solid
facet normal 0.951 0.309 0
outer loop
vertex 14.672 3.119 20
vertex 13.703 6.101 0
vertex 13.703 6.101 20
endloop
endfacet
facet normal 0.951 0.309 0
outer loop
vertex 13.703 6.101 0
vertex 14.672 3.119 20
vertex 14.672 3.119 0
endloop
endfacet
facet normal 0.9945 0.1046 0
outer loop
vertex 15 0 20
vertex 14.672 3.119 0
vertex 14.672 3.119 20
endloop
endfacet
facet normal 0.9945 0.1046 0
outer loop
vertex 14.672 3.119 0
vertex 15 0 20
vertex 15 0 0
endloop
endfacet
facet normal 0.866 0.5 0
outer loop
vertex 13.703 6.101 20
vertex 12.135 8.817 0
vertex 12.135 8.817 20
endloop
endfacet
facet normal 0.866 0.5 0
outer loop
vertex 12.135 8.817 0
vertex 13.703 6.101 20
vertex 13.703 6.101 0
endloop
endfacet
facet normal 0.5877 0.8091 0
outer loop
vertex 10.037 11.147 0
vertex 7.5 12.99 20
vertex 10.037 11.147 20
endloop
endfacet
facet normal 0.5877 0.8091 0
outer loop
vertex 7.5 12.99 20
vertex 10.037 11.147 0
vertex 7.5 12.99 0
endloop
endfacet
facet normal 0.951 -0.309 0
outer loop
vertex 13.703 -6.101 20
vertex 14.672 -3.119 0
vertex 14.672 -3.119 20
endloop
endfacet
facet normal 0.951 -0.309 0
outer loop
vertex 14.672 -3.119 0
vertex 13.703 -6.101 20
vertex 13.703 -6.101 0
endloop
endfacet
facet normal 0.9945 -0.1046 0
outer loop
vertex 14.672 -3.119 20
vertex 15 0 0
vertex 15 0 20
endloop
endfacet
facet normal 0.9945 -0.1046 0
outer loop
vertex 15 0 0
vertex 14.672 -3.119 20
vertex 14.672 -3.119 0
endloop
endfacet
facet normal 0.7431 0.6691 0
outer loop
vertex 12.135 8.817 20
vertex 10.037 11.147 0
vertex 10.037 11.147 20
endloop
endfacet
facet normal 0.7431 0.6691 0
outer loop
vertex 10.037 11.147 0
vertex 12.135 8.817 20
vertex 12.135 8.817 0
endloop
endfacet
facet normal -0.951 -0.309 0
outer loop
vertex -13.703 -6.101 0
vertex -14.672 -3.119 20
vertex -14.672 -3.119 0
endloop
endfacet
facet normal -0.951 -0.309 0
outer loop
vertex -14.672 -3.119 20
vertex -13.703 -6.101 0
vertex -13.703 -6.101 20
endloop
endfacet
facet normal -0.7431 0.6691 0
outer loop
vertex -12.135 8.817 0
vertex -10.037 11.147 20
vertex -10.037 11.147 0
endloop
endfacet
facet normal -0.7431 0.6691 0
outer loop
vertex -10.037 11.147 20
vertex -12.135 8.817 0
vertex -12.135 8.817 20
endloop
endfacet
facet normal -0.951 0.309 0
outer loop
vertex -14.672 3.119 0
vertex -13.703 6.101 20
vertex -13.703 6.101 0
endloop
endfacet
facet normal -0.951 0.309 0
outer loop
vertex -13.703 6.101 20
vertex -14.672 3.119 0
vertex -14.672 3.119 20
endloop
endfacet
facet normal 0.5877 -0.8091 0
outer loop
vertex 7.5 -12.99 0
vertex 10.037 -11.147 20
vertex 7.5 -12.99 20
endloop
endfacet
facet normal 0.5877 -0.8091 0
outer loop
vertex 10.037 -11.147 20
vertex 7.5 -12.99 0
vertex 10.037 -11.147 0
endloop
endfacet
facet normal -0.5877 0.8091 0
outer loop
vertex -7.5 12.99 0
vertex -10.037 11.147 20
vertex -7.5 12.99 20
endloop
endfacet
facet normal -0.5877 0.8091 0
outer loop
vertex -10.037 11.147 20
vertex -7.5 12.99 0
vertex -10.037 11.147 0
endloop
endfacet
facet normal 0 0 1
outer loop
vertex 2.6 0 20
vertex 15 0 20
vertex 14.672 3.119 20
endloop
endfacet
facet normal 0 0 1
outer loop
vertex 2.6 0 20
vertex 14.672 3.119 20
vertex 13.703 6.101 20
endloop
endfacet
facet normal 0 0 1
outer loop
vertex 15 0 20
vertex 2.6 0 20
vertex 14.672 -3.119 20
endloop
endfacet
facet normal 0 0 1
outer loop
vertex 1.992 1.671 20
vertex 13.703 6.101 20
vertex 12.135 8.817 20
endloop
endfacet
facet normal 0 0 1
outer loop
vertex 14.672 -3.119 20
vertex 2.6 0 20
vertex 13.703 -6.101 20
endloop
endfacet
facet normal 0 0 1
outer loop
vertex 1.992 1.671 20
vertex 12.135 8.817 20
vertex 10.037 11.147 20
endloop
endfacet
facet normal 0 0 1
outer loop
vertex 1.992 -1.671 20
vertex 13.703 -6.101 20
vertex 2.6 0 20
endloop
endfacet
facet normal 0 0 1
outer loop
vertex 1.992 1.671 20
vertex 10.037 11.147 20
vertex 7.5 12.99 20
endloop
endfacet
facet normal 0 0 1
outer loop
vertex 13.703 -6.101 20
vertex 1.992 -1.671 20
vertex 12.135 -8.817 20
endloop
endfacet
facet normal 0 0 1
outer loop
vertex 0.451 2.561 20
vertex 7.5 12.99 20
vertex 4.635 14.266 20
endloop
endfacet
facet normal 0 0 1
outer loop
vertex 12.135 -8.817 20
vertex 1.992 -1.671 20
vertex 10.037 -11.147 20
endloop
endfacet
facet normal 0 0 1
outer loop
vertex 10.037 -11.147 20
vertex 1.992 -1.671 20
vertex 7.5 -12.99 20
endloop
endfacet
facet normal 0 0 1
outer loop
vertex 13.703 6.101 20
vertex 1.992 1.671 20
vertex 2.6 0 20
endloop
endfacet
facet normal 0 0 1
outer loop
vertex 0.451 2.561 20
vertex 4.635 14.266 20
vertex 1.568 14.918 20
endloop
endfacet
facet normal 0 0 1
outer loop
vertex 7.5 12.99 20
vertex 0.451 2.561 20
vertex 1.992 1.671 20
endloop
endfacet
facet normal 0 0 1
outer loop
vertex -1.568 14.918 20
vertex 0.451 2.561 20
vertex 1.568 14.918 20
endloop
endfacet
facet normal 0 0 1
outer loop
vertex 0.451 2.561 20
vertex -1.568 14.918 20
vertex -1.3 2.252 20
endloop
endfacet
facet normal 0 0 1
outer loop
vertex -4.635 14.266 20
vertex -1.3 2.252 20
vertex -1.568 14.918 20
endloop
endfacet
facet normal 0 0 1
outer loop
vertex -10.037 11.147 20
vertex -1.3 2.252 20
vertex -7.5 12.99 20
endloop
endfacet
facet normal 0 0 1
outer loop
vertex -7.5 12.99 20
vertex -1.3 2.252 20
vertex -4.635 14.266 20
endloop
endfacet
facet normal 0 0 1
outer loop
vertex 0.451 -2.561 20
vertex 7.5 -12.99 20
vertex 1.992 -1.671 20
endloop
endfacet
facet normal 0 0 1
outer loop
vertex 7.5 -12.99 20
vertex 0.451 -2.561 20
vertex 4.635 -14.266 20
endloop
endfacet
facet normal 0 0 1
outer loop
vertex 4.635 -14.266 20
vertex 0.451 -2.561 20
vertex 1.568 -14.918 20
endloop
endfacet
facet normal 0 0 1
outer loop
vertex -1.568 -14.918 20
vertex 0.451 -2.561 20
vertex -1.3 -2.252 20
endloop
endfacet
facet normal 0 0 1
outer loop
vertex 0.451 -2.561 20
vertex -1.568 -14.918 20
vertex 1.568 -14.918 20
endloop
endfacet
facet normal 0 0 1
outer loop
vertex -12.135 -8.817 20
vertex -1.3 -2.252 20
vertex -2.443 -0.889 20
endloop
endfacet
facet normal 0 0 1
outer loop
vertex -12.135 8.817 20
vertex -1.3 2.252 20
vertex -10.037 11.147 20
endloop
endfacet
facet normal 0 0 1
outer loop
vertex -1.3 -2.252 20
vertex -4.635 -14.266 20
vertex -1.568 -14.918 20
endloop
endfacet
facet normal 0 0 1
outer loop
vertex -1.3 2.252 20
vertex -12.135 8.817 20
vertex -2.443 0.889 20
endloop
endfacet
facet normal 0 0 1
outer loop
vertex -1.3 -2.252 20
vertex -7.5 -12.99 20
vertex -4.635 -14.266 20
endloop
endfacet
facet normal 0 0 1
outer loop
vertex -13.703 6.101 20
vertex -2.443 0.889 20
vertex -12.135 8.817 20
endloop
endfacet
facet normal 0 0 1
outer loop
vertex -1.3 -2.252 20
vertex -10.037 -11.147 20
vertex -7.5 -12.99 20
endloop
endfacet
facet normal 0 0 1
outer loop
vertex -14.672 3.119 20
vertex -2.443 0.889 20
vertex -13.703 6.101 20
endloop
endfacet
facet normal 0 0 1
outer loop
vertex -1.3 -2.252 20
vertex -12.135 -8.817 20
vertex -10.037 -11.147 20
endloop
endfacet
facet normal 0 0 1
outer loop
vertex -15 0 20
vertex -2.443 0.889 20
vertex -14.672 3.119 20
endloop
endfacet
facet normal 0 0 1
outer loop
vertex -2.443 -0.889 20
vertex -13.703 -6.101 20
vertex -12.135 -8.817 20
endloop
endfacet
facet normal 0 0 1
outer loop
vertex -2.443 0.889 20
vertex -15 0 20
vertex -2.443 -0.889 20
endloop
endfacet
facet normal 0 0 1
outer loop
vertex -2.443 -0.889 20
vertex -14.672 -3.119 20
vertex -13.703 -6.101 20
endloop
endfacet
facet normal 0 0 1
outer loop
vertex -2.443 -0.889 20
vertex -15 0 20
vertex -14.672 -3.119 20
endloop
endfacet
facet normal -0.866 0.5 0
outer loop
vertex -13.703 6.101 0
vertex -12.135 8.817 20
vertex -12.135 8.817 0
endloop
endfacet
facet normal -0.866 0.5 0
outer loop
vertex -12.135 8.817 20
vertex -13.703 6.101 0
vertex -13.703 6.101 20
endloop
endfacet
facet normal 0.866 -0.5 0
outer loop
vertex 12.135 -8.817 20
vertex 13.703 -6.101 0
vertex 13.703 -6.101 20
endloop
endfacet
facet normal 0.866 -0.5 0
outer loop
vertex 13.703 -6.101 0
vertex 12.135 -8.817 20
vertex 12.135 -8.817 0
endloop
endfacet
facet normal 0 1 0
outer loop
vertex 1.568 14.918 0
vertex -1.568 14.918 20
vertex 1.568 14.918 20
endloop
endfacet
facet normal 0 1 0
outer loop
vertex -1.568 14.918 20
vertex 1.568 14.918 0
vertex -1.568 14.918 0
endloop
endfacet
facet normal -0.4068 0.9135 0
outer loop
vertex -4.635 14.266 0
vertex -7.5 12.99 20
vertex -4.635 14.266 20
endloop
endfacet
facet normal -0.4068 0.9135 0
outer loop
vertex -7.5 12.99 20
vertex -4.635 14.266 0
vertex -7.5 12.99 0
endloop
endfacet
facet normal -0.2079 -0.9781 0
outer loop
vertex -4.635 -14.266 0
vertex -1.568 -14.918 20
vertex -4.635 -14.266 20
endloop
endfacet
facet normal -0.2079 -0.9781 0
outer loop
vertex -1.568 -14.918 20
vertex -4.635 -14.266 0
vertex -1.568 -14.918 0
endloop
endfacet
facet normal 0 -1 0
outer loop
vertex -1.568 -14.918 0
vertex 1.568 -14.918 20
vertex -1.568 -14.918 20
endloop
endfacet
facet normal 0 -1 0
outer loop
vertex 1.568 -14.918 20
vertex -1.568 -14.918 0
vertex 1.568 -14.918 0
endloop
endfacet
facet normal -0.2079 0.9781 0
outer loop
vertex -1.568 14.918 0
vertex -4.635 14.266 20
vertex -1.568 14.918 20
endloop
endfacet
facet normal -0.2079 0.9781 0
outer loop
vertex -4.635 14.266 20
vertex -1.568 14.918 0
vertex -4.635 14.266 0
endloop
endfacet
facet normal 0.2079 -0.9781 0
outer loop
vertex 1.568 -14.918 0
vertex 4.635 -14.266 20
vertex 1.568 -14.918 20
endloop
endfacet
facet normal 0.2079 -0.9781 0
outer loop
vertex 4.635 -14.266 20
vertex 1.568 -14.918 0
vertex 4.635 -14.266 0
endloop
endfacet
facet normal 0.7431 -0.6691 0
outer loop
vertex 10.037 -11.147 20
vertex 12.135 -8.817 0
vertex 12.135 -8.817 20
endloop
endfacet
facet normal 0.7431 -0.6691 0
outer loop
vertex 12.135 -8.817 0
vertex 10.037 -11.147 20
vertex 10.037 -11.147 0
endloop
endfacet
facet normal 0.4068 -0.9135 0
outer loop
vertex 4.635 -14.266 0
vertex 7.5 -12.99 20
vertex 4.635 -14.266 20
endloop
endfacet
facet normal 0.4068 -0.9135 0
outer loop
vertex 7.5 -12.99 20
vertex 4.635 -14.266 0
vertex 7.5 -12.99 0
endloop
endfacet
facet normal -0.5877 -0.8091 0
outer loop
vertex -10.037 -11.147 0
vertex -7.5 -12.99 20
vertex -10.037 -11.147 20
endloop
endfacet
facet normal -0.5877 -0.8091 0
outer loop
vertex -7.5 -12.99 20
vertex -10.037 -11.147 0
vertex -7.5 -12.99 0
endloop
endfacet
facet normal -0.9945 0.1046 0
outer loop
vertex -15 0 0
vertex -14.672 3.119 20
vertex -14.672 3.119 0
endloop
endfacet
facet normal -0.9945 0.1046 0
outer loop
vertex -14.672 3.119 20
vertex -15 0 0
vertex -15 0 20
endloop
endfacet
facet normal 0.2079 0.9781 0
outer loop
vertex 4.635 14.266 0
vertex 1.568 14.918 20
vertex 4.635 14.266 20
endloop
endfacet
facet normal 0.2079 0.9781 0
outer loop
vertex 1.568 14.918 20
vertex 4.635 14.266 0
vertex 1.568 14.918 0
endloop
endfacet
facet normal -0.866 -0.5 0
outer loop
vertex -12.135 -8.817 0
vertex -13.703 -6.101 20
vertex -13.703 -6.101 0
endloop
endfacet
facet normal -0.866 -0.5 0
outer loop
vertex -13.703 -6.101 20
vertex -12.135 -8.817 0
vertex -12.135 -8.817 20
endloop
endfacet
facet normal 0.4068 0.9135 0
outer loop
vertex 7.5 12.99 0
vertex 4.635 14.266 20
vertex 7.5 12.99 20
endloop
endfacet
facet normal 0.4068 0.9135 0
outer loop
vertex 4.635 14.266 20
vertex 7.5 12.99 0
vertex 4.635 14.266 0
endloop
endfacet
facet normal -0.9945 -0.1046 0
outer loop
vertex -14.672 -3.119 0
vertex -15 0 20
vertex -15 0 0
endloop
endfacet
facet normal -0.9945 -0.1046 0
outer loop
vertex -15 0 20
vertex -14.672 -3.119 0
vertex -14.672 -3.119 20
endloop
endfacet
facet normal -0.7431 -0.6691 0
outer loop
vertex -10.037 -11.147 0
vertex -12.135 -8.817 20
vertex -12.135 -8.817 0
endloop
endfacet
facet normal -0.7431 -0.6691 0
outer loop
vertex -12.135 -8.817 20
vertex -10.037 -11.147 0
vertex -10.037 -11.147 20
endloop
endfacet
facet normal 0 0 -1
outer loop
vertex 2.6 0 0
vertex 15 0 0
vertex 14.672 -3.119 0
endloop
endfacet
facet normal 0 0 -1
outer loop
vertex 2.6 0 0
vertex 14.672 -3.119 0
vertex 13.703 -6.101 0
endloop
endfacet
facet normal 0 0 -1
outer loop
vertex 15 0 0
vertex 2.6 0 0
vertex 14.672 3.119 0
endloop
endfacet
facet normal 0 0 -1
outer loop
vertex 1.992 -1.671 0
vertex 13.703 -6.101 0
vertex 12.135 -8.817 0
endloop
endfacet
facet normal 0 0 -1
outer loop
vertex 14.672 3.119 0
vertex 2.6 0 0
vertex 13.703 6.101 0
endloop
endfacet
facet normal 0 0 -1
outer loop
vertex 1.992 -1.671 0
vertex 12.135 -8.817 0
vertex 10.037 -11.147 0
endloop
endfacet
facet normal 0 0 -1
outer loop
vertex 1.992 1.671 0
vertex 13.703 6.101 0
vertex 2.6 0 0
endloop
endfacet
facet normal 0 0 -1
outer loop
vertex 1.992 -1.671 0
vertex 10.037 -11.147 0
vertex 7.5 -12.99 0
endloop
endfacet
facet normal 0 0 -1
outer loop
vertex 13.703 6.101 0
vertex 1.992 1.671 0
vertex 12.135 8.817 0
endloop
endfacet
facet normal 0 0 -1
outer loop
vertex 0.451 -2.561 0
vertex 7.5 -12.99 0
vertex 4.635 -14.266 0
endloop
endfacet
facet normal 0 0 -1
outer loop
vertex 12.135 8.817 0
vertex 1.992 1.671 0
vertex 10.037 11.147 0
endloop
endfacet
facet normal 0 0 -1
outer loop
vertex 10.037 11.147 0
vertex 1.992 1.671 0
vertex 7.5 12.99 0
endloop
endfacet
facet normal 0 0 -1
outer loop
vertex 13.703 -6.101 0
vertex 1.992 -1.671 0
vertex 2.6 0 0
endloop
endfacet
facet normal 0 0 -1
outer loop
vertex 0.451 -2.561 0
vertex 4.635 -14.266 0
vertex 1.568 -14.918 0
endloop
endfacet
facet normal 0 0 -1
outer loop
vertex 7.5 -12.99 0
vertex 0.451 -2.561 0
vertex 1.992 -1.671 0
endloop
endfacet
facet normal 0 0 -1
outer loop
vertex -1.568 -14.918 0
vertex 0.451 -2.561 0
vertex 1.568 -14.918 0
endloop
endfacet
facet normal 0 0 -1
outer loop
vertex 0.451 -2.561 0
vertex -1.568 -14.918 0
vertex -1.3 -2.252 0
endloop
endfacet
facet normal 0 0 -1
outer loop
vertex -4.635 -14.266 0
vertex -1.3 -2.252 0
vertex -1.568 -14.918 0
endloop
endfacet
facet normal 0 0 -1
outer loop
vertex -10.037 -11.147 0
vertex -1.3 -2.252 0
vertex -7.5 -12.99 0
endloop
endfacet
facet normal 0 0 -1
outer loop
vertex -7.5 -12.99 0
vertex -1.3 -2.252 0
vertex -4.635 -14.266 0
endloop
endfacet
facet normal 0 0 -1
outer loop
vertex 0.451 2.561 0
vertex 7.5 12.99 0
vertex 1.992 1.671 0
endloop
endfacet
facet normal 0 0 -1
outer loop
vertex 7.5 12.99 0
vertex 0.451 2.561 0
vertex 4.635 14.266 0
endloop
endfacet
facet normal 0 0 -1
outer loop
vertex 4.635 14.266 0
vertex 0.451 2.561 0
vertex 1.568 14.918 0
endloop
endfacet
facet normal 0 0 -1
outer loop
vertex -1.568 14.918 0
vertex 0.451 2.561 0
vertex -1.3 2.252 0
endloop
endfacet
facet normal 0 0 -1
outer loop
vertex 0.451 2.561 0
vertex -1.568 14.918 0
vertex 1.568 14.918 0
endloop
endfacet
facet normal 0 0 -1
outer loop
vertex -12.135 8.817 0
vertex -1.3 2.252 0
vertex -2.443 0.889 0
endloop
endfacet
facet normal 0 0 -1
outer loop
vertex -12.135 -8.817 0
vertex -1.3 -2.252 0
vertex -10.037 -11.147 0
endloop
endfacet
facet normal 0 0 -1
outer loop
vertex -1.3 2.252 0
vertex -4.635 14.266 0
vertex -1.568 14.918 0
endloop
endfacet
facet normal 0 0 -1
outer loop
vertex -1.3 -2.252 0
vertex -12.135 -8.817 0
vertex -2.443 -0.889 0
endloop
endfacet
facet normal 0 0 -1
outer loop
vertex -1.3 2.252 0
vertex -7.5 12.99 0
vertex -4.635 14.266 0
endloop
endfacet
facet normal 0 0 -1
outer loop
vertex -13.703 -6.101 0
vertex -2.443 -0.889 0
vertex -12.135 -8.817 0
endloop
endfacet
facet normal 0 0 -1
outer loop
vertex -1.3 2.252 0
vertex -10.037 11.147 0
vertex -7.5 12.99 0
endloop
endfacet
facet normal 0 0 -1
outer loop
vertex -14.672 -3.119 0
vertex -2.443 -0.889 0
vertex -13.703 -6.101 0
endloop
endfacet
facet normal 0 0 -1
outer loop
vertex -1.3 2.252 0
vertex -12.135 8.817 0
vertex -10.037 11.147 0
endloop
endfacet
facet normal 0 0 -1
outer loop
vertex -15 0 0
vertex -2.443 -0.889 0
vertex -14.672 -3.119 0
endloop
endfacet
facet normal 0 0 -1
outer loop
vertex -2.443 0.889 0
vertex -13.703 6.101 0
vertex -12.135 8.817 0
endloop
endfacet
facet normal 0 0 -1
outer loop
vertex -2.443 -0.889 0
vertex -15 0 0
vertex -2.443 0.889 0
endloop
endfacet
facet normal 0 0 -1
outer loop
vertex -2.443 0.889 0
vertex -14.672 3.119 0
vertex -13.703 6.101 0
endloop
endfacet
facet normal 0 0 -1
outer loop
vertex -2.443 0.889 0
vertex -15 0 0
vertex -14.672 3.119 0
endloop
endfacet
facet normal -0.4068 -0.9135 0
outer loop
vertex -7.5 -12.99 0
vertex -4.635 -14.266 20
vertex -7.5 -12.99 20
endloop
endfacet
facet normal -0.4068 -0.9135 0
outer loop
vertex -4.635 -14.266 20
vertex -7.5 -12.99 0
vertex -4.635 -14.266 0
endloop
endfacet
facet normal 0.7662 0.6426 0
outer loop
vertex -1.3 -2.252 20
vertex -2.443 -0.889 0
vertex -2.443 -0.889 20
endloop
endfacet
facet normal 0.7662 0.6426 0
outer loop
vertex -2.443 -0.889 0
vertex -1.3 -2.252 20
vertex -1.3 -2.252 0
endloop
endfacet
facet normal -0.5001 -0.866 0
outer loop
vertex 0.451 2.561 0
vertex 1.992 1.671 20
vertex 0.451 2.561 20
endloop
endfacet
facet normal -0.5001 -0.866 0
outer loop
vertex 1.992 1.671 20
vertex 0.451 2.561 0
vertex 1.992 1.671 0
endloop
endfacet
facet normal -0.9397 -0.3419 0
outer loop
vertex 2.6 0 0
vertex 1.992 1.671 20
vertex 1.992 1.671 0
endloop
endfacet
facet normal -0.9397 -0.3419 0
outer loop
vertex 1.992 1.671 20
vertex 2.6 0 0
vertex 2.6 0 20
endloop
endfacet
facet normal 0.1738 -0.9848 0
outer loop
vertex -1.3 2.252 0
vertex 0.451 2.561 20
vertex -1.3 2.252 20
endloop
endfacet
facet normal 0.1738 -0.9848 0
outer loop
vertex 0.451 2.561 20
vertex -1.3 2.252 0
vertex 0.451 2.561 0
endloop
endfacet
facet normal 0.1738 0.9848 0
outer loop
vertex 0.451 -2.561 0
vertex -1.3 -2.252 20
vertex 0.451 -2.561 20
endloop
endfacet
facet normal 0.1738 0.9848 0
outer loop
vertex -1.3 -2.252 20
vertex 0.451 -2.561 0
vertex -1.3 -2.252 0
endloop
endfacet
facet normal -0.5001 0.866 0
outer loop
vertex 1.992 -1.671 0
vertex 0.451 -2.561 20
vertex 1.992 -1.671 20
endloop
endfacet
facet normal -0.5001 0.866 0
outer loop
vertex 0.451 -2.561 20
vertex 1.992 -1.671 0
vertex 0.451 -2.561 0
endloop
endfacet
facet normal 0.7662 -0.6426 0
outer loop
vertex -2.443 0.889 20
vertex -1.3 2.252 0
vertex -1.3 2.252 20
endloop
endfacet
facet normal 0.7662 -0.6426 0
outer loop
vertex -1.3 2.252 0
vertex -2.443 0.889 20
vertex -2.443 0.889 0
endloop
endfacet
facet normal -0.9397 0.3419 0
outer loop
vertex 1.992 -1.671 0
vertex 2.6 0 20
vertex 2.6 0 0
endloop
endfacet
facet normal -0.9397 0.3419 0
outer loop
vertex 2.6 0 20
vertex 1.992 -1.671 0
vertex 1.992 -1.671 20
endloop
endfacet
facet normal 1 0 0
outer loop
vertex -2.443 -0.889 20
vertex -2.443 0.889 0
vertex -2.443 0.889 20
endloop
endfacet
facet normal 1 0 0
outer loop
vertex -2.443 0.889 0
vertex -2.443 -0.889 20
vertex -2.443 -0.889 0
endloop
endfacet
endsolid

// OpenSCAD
/*
 *
 * 3D-printable extension piece for 30mm diameter door stop
 *
 */
difference () {
    cylinder( r=15, h=20 );
    translate( [0,0,-5] ) cylinder( r=2.6, h=30 );
}
